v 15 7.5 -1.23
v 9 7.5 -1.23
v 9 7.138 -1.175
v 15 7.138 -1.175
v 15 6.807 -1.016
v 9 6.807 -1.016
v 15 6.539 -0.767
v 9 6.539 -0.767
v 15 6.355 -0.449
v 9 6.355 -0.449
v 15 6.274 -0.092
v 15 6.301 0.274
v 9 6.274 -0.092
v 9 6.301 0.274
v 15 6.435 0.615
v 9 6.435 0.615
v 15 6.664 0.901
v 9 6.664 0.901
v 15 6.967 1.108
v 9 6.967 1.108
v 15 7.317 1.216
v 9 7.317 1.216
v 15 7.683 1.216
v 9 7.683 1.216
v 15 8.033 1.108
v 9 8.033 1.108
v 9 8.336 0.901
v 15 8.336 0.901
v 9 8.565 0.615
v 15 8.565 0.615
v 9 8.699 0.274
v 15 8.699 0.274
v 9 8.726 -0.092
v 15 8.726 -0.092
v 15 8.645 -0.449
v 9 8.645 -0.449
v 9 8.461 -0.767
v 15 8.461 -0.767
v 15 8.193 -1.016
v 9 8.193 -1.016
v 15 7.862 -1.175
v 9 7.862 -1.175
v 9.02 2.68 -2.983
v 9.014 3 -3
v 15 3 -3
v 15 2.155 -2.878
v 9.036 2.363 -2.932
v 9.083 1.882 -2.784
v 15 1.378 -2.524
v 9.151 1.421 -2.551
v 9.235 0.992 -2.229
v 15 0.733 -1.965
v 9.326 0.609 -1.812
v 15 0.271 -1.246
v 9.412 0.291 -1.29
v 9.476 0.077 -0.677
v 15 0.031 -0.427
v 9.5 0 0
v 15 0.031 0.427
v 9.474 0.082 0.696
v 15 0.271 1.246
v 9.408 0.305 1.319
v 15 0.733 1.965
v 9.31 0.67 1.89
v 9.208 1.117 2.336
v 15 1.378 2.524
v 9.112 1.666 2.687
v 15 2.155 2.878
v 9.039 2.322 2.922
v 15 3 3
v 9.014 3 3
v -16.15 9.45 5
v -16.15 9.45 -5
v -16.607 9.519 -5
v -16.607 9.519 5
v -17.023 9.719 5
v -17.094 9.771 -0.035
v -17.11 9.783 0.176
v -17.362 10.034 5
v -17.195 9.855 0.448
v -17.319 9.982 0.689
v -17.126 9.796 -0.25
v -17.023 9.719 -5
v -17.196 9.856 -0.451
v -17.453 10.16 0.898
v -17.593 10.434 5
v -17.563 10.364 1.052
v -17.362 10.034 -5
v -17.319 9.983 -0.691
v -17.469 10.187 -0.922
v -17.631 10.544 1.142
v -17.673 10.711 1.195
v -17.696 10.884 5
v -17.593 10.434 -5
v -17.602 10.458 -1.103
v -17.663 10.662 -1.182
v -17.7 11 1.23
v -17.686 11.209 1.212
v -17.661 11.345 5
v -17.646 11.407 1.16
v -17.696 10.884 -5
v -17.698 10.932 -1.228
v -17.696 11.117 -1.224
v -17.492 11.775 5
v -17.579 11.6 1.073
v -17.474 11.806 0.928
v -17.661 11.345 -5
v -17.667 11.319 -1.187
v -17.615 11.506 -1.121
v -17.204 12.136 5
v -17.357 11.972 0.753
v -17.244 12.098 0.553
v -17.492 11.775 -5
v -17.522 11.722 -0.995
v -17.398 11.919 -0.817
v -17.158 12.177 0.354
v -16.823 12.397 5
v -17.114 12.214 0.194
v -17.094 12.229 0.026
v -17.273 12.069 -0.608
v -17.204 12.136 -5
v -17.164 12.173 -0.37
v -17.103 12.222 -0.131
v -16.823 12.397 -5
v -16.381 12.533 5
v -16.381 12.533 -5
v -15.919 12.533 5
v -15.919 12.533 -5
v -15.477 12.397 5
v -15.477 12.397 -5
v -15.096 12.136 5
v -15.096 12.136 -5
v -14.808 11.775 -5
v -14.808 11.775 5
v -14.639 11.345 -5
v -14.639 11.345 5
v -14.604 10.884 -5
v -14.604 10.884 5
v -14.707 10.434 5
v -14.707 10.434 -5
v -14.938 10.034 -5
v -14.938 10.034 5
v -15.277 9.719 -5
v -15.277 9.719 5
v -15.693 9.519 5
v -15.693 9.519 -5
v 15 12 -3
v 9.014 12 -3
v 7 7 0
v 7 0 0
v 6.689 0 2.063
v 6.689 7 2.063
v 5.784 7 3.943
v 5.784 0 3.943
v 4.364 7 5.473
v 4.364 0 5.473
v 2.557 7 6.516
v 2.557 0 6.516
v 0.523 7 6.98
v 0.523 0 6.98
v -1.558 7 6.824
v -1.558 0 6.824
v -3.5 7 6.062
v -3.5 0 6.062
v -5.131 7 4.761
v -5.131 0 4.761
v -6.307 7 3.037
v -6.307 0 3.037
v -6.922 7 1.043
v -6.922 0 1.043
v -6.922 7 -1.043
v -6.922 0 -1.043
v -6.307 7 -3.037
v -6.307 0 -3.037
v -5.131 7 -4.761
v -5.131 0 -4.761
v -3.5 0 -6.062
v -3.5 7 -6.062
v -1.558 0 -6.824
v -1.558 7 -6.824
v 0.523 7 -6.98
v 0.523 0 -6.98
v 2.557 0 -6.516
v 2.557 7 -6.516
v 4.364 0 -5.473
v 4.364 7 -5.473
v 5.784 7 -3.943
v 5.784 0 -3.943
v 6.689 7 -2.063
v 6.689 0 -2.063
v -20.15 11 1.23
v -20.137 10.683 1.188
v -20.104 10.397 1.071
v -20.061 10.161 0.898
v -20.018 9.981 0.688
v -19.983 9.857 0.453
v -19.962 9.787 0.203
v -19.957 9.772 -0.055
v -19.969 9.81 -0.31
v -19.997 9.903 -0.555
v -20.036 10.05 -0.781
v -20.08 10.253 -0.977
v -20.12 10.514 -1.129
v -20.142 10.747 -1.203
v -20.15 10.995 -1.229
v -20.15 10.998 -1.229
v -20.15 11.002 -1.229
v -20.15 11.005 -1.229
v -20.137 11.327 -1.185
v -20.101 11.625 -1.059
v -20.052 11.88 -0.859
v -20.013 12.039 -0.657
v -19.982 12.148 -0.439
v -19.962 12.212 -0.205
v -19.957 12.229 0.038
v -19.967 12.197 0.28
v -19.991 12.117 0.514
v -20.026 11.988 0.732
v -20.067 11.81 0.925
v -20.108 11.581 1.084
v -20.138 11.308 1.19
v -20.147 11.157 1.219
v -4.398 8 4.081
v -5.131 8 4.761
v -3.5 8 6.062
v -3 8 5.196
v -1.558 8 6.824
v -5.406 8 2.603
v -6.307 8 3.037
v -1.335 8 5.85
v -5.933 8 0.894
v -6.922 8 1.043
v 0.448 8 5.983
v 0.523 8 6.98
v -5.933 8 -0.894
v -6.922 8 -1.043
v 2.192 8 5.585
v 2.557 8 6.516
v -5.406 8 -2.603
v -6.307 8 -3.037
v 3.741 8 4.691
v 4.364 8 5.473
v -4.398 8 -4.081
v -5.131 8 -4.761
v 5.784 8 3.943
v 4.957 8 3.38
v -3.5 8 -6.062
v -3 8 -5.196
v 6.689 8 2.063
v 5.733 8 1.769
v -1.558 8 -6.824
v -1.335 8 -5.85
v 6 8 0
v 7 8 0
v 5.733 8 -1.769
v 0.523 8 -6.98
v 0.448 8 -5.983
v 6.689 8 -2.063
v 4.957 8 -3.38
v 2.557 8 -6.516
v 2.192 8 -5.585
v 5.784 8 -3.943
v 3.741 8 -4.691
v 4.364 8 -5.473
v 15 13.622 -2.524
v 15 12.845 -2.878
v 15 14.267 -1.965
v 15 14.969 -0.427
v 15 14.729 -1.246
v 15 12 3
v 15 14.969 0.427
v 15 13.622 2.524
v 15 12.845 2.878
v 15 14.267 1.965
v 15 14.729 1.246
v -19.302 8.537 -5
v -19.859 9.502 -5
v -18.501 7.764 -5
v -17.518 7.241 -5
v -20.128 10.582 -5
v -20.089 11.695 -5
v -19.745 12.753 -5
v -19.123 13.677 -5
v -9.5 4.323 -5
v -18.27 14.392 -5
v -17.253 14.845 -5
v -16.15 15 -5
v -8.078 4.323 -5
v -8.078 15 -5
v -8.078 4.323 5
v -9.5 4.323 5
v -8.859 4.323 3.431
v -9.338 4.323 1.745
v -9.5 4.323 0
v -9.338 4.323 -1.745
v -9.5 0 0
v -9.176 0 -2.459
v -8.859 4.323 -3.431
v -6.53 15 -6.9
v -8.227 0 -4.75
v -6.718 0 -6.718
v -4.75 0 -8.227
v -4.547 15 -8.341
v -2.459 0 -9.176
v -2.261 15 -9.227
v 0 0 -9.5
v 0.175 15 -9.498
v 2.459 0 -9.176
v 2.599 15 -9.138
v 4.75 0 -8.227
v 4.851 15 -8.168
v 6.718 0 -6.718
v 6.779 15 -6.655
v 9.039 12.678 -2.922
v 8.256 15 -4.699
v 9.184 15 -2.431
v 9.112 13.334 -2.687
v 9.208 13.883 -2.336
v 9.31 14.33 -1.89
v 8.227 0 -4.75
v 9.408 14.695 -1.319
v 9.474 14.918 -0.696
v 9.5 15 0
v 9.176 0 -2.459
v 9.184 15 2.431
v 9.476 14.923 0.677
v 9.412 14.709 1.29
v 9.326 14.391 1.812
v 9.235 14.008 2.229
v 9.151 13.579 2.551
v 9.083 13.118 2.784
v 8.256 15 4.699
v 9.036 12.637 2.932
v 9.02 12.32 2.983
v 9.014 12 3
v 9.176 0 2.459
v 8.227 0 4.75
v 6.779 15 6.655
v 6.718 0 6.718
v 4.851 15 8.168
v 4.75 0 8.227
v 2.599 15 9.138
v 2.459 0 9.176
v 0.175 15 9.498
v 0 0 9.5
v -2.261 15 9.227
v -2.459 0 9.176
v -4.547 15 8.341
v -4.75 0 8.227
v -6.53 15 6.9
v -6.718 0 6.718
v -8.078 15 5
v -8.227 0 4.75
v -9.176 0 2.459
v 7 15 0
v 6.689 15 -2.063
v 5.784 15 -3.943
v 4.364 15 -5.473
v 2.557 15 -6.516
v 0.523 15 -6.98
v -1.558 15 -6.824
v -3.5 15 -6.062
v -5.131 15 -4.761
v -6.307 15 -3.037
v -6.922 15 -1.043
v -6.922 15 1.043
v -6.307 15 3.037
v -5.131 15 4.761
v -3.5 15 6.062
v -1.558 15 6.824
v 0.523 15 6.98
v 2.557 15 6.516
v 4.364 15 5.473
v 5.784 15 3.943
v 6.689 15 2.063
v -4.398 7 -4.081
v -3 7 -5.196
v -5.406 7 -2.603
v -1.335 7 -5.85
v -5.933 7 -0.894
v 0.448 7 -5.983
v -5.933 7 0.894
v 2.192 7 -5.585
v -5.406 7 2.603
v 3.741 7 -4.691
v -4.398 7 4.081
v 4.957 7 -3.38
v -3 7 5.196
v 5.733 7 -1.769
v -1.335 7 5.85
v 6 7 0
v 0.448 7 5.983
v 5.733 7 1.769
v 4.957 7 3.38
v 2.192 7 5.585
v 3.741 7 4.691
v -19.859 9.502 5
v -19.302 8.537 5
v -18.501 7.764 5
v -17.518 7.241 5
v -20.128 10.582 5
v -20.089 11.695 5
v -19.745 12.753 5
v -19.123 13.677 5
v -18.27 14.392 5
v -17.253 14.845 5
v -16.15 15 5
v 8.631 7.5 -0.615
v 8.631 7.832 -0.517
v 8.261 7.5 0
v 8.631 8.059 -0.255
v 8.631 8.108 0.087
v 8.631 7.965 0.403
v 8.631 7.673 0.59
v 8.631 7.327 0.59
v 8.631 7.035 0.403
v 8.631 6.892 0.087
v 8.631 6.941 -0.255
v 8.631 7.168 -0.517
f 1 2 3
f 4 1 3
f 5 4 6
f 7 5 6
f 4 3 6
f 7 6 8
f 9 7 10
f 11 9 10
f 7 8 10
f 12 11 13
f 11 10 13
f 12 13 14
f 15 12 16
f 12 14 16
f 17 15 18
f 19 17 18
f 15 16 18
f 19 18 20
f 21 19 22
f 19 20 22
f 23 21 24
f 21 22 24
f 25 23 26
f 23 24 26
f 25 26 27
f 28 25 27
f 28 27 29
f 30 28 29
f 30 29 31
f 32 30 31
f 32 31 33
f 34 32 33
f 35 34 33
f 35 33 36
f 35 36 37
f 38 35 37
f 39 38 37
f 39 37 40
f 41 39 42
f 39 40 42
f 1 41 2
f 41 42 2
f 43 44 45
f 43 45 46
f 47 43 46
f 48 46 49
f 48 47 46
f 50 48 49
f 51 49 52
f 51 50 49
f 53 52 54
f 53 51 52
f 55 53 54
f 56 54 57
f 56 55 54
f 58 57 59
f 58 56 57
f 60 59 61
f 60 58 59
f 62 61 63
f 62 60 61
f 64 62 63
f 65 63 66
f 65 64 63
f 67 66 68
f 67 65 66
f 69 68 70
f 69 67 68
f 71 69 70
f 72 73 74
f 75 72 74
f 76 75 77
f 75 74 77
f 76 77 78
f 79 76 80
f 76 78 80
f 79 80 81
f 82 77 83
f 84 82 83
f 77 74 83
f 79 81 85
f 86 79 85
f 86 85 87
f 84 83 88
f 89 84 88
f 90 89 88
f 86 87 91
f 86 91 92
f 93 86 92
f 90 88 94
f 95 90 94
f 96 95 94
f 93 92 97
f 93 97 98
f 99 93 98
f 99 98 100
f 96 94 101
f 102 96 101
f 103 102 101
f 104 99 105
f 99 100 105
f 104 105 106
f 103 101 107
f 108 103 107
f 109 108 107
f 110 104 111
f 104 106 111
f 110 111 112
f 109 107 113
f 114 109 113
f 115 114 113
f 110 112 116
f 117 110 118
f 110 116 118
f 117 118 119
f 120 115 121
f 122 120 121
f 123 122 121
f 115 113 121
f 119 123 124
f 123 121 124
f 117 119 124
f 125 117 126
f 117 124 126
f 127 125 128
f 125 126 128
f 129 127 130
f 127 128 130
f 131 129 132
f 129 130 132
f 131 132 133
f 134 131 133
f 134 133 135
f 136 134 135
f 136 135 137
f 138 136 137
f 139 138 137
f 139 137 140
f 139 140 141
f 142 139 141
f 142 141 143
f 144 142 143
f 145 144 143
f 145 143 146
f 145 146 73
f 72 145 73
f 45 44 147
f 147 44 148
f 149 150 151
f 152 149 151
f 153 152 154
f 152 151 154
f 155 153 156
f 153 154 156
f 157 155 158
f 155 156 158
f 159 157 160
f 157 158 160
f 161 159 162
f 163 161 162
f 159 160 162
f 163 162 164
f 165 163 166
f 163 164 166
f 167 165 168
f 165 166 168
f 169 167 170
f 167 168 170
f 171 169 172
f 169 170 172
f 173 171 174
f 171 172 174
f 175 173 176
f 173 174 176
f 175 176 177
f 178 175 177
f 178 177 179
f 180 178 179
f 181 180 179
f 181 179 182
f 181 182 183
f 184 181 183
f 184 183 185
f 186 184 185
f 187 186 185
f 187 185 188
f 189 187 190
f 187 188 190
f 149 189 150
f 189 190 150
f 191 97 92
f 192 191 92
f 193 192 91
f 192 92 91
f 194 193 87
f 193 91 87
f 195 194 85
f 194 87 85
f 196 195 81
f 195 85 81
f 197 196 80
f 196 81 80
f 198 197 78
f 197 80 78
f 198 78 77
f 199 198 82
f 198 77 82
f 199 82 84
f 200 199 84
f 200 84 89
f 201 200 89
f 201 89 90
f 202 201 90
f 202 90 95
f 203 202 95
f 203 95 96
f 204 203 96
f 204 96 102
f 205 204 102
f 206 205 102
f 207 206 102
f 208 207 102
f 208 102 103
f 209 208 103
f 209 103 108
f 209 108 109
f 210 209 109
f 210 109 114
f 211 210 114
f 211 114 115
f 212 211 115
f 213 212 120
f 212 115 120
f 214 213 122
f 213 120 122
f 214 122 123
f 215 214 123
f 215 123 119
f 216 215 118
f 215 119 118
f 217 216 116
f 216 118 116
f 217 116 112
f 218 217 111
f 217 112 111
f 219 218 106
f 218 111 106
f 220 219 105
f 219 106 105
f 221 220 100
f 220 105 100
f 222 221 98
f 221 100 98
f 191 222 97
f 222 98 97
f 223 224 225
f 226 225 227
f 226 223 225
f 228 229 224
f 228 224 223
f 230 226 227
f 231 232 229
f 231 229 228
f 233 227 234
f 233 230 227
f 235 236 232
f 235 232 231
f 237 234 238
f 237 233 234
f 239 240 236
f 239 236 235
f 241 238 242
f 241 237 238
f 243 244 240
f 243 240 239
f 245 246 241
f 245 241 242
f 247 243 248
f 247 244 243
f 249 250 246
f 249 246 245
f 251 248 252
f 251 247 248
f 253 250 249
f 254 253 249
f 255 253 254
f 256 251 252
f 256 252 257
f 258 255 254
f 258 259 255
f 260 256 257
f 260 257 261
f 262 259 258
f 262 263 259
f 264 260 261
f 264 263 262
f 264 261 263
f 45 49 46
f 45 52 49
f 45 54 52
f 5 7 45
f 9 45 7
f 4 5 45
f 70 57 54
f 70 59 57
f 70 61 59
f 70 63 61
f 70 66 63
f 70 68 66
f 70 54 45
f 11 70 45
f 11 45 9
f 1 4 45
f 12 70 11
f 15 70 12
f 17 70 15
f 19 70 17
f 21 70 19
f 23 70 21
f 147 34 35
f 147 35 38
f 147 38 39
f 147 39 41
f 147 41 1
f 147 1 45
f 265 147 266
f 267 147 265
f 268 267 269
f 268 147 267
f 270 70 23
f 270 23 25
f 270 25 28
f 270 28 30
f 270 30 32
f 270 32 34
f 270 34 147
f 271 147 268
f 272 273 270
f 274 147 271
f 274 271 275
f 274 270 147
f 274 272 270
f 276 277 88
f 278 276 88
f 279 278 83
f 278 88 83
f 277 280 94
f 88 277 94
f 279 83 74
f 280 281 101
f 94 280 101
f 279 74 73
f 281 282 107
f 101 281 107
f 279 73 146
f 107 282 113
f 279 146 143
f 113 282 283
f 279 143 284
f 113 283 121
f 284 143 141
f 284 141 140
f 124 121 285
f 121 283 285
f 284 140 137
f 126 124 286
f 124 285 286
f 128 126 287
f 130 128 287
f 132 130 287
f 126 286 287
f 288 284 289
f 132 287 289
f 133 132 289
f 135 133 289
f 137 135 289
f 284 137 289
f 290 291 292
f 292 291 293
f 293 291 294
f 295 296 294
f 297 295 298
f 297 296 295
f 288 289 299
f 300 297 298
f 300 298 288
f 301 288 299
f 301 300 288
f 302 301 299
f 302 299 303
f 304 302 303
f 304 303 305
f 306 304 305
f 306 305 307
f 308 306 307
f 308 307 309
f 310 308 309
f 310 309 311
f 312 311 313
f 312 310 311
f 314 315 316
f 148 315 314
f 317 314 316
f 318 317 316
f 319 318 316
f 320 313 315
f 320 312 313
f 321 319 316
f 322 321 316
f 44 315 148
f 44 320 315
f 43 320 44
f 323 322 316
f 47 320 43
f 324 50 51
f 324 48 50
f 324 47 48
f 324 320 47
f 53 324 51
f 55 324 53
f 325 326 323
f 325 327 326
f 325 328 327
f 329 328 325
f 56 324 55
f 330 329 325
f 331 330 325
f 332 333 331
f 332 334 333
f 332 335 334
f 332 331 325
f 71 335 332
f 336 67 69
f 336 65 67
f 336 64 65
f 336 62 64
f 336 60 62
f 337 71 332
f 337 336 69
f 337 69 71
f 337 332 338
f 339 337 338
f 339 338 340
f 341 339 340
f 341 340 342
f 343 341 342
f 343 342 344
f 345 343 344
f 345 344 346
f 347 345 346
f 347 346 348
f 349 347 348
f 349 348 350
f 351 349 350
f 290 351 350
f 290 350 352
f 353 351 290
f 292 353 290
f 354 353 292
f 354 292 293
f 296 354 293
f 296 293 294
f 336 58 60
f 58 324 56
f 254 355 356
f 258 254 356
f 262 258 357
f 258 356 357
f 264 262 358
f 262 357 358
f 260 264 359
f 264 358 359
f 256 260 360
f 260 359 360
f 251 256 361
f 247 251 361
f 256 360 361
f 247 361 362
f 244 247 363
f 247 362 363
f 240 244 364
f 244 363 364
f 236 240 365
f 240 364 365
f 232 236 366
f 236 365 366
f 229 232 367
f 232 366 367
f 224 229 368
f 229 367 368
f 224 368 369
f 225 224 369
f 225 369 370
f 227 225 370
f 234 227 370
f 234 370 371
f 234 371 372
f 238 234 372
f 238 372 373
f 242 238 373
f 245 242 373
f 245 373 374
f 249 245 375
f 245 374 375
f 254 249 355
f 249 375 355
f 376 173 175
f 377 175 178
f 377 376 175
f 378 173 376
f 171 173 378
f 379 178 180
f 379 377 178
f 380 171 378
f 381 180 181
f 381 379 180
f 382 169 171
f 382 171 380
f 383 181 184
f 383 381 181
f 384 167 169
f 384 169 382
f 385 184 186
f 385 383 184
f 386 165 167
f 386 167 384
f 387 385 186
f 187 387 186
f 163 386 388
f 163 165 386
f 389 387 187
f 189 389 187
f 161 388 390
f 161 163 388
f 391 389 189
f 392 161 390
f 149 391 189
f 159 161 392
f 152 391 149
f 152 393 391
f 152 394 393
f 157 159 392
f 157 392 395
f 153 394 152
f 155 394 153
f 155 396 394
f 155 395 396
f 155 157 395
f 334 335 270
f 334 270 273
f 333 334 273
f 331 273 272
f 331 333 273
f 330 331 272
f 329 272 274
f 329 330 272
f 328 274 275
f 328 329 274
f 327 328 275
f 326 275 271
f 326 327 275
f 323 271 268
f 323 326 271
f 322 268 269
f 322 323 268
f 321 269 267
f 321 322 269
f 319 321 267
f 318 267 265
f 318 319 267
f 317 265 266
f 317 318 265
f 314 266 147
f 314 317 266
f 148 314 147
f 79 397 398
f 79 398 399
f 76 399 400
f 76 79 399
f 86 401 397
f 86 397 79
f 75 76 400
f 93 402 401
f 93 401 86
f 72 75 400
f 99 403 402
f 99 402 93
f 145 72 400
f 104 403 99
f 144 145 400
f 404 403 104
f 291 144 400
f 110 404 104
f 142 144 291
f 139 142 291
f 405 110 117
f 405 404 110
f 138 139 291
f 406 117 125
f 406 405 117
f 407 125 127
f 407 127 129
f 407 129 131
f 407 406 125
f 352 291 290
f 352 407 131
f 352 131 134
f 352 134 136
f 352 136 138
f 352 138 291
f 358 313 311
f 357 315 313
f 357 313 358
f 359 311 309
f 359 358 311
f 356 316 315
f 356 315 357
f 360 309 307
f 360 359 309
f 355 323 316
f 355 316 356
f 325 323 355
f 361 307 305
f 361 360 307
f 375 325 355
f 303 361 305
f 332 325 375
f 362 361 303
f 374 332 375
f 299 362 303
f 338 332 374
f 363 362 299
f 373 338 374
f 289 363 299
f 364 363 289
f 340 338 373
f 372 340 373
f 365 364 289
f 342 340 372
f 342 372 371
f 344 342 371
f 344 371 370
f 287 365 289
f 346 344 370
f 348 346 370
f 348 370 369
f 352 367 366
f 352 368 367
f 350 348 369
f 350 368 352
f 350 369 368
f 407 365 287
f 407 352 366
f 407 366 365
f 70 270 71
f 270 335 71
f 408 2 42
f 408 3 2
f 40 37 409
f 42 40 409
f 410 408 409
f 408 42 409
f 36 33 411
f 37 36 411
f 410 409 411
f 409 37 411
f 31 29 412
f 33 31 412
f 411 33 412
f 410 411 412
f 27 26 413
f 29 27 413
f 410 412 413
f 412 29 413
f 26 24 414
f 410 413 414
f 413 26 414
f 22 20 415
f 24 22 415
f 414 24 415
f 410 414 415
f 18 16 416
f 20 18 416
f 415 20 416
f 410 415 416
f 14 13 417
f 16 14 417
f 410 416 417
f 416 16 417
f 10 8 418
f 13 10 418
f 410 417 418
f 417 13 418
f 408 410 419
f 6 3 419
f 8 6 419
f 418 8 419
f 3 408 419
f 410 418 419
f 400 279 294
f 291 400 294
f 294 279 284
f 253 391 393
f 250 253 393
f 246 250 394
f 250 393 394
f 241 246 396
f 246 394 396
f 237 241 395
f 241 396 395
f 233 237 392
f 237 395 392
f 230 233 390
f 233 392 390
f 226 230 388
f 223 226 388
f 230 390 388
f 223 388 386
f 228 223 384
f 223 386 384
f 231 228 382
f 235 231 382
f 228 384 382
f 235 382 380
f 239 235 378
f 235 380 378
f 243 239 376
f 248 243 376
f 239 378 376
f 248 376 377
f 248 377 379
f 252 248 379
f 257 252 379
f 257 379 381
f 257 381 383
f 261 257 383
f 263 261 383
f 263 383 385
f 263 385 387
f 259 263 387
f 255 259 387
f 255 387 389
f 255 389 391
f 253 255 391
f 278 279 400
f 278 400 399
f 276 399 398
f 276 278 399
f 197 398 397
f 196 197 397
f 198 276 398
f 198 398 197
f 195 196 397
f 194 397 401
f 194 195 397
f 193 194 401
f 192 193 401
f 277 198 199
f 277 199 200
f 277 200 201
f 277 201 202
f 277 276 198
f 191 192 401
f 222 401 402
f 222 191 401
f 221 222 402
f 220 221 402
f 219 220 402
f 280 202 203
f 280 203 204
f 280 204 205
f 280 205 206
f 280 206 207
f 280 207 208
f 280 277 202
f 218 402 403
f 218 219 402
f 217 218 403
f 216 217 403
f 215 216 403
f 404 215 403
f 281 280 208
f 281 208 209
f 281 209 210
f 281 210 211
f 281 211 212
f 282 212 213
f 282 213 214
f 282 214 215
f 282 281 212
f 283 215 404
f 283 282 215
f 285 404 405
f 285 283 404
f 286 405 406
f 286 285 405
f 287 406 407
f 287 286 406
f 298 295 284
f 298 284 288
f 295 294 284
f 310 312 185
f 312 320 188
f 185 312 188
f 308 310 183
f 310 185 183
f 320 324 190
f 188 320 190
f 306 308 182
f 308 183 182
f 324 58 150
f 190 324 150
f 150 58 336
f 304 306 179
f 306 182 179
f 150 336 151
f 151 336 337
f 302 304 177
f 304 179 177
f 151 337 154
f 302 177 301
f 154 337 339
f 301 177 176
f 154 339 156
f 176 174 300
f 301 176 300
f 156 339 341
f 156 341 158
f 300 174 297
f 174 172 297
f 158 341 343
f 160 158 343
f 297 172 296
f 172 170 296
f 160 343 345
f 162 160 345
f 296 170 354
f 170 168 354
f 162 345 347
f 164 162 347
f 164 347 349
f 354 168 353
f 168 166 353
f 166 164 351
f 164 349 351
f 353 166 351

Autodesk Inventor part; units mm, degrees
ref_plane "XZ Plane" through (0, 0, 0) normal (0, 1, 0) x (-1, 0, 0)
ref_plane "XY Plane" through (0, 0, 0) normal (0, 0, 1) x (1, 0, 0)
sketch "Sketch1" plane through (0, 0, 0) normal (0, 1, 0) x (-1, 0, 0)
  circle A0 centre (0, 0) radius 9.5
  dimension "d0" = 19
extrude "Extrusion1" add sketch "Sketch1" along normal blind 15
sketch "Sketch2" plane through (0, 0, 0) normal (0, -1, 0) x (1, 0, 0)
  circle A0 centre (0, 0) radius 9.5 projected
  circle A1 centre (0, 0) radius 7
  dimension "d3" = 14
extrude "Extrusion2" cut sketch "Sketch2" against normal blind 7 contours A1
sketch "Sketch3" plane through (0, 15, 0) normal (0, 1, 0) x (1, 0, 0)
  circle A0 centre (0, 0) radius 9.5 projected
  circle A1 centre (0, 0) radius 7
  dimension "d6" = 14
extrude "Extrusion3" cut sketch "Sketch3" against normal blind 7 contours A1
sketch "Sketch5" plane through (0, 7, 0) normal (0, -1, 0) x (1, 0, 0)
  circle A0 centre (0, 0) radius 7 projected
  circle A1 centre (0, 0) radius 6
  dimension "d9" = 12
extrude "Extrusion4" cut sketch "Sketch5" against normal through all contours A1
ref_plane "Work Plane1" through (9.5, 0, 0) normal (1, 0, 0) x (0, 1, 0)
sketch "Sketch6" plane through (9.5, 0, 0) normal (1, 0, 0) x (0, 1, 0)
  line L0 (0, 9.5) -> (15, 9.5) projected
  line L1 (12, 0) -> (3, 0) construction
  line L2 (7, -7) -> (7, 7) projected
  line L3 (12, 3) -> (3, 3)
  line L4 (3, -3) -> (12, -3)
  arc A0 (12, -3) -> (12, 3) centre (12, 0) ccw
  arc A1 (3, 3) -> (3, -3) centre (3, 0) ccw
  line L5 (0, 9.5) -> (0, -9.5) projected
  line L6 (15, -9.5) -> (15, 9.5) projected
  point P0 (0, 0)
  point P1 (7.5, 0)
  point P2 (15, 0)
  dimension "d13" = 3
extrude "Extrusion5" add sketch "Sketch6" along normal blind 5.5 and the other way blind 1.25 contours A1 L3 L2 L4 | A0 L4 L2 L3
sketch "Sketch7" plane through (0, 0, 0) normal (0, 0, 1) x (1, 0, 0)
  line L0 (-7, 7) -> (-7, 0) construction
  line L1 (-7, 0) -> (-9.5, 0) construction
  line L2 (-9.5, 0) -> (-9.5, 15) construction
  line L3 (-9.5, 15) -> (-7, 15) construction
  line L4 (-7, 15) -> (-7, 8) construction
  line L5 (-7, 8) -> (-6, 8) construction
  line L6 (-6, 8) -> (-6, 7) construction
  line L7 (-6, 7) -> (-7, 7) construction
  line L8 (7, 0) -> (7, 7) construction
  line L9 (7, 7) -> (6, 7) construction
  line L10 (6, 7) -> (6, 8) construction
  line L11 (6, 8) -> (7, 8) construction
  line L12 (7, 8) -> (7, 15) construction
  line L13 (7, 15) -> (9.5, 15) construction
  line L14 (9.5, 15) -> (15, 15) construction
  line L15 (15, 15) -> (15, 0) construction
  line L16 (15, 0) -> (9.5, 0) construction
  line L17 (9.5, 0) -> (7, 0) construction
  line L18 (-9.5, 15) -> (-16.15, 15)
  line L19 (-17.5181, 7.2412) -> (-9.5, 4.3229)
  line L20 (-9.5, 4.3229) -> (-7.9897, 4.3229)
  line L21 (-7.9897, 4.3229) -> (-7.9897, 15)
  line L22 (-9.5, 15) -> (-7.9897, 15)
  line L23 (9.5, 15) -> (-9.5, 15) projected
  arc A0 (-16.15, 15) -> (-17.5181, 7.2412) centre (-16.15, 11) ccw
  point P0 (0, 0)
  dimension "d18" = 4
  dimension "d19" = 20
  dimension "d21" = 16.15
extrude "Extrusion6" add sketch "Sketch7" along normal mid plane 10
hole "Hole1" at (-16.15, 11, 5) direction (0, 0, -1) diameter 3.1 end through all
sketch "Sketch8" plane through (15, 0, 0) normal (1, 0, 0) x (0, 0, -1)
  arc A0 (3, 12) -> (-3, 12) centre (0, 12) ccw projected
  line L0 (0, 15) -> (0, 7.5)
  point P0 (0, 0)
hole "Hole2" at (15, 7.5, 0) direction (-1, 0, 0) diameter 2.459 depth 6 tip angle 118 thread size "M3x0.5" class "6H" standard "ISO Metric profile"
ref_plane "Work Plane2" through (-20.15, 11, 0) normal (1, 0, 0) x (0, 1, 0)
sketch "Sketch9" plane through (-20.15, 11, 0) normal (1, 0, 0) x (0, 1, 0)
  line L0 (-1.55, 5) -> (1.55, 5) projected
  line L1 (0, 5) -> (0, 0)
  point P0 (-11, 0)
hole "Hole3" at (-20.15, 11, 0) direction (1, 0, 0) diameter 2.459 depth 4 tip angle 118 thread size "M3x0.5" class "6H" standard "ISO Metric profile"
properties part number "500-007" material "Steel"
